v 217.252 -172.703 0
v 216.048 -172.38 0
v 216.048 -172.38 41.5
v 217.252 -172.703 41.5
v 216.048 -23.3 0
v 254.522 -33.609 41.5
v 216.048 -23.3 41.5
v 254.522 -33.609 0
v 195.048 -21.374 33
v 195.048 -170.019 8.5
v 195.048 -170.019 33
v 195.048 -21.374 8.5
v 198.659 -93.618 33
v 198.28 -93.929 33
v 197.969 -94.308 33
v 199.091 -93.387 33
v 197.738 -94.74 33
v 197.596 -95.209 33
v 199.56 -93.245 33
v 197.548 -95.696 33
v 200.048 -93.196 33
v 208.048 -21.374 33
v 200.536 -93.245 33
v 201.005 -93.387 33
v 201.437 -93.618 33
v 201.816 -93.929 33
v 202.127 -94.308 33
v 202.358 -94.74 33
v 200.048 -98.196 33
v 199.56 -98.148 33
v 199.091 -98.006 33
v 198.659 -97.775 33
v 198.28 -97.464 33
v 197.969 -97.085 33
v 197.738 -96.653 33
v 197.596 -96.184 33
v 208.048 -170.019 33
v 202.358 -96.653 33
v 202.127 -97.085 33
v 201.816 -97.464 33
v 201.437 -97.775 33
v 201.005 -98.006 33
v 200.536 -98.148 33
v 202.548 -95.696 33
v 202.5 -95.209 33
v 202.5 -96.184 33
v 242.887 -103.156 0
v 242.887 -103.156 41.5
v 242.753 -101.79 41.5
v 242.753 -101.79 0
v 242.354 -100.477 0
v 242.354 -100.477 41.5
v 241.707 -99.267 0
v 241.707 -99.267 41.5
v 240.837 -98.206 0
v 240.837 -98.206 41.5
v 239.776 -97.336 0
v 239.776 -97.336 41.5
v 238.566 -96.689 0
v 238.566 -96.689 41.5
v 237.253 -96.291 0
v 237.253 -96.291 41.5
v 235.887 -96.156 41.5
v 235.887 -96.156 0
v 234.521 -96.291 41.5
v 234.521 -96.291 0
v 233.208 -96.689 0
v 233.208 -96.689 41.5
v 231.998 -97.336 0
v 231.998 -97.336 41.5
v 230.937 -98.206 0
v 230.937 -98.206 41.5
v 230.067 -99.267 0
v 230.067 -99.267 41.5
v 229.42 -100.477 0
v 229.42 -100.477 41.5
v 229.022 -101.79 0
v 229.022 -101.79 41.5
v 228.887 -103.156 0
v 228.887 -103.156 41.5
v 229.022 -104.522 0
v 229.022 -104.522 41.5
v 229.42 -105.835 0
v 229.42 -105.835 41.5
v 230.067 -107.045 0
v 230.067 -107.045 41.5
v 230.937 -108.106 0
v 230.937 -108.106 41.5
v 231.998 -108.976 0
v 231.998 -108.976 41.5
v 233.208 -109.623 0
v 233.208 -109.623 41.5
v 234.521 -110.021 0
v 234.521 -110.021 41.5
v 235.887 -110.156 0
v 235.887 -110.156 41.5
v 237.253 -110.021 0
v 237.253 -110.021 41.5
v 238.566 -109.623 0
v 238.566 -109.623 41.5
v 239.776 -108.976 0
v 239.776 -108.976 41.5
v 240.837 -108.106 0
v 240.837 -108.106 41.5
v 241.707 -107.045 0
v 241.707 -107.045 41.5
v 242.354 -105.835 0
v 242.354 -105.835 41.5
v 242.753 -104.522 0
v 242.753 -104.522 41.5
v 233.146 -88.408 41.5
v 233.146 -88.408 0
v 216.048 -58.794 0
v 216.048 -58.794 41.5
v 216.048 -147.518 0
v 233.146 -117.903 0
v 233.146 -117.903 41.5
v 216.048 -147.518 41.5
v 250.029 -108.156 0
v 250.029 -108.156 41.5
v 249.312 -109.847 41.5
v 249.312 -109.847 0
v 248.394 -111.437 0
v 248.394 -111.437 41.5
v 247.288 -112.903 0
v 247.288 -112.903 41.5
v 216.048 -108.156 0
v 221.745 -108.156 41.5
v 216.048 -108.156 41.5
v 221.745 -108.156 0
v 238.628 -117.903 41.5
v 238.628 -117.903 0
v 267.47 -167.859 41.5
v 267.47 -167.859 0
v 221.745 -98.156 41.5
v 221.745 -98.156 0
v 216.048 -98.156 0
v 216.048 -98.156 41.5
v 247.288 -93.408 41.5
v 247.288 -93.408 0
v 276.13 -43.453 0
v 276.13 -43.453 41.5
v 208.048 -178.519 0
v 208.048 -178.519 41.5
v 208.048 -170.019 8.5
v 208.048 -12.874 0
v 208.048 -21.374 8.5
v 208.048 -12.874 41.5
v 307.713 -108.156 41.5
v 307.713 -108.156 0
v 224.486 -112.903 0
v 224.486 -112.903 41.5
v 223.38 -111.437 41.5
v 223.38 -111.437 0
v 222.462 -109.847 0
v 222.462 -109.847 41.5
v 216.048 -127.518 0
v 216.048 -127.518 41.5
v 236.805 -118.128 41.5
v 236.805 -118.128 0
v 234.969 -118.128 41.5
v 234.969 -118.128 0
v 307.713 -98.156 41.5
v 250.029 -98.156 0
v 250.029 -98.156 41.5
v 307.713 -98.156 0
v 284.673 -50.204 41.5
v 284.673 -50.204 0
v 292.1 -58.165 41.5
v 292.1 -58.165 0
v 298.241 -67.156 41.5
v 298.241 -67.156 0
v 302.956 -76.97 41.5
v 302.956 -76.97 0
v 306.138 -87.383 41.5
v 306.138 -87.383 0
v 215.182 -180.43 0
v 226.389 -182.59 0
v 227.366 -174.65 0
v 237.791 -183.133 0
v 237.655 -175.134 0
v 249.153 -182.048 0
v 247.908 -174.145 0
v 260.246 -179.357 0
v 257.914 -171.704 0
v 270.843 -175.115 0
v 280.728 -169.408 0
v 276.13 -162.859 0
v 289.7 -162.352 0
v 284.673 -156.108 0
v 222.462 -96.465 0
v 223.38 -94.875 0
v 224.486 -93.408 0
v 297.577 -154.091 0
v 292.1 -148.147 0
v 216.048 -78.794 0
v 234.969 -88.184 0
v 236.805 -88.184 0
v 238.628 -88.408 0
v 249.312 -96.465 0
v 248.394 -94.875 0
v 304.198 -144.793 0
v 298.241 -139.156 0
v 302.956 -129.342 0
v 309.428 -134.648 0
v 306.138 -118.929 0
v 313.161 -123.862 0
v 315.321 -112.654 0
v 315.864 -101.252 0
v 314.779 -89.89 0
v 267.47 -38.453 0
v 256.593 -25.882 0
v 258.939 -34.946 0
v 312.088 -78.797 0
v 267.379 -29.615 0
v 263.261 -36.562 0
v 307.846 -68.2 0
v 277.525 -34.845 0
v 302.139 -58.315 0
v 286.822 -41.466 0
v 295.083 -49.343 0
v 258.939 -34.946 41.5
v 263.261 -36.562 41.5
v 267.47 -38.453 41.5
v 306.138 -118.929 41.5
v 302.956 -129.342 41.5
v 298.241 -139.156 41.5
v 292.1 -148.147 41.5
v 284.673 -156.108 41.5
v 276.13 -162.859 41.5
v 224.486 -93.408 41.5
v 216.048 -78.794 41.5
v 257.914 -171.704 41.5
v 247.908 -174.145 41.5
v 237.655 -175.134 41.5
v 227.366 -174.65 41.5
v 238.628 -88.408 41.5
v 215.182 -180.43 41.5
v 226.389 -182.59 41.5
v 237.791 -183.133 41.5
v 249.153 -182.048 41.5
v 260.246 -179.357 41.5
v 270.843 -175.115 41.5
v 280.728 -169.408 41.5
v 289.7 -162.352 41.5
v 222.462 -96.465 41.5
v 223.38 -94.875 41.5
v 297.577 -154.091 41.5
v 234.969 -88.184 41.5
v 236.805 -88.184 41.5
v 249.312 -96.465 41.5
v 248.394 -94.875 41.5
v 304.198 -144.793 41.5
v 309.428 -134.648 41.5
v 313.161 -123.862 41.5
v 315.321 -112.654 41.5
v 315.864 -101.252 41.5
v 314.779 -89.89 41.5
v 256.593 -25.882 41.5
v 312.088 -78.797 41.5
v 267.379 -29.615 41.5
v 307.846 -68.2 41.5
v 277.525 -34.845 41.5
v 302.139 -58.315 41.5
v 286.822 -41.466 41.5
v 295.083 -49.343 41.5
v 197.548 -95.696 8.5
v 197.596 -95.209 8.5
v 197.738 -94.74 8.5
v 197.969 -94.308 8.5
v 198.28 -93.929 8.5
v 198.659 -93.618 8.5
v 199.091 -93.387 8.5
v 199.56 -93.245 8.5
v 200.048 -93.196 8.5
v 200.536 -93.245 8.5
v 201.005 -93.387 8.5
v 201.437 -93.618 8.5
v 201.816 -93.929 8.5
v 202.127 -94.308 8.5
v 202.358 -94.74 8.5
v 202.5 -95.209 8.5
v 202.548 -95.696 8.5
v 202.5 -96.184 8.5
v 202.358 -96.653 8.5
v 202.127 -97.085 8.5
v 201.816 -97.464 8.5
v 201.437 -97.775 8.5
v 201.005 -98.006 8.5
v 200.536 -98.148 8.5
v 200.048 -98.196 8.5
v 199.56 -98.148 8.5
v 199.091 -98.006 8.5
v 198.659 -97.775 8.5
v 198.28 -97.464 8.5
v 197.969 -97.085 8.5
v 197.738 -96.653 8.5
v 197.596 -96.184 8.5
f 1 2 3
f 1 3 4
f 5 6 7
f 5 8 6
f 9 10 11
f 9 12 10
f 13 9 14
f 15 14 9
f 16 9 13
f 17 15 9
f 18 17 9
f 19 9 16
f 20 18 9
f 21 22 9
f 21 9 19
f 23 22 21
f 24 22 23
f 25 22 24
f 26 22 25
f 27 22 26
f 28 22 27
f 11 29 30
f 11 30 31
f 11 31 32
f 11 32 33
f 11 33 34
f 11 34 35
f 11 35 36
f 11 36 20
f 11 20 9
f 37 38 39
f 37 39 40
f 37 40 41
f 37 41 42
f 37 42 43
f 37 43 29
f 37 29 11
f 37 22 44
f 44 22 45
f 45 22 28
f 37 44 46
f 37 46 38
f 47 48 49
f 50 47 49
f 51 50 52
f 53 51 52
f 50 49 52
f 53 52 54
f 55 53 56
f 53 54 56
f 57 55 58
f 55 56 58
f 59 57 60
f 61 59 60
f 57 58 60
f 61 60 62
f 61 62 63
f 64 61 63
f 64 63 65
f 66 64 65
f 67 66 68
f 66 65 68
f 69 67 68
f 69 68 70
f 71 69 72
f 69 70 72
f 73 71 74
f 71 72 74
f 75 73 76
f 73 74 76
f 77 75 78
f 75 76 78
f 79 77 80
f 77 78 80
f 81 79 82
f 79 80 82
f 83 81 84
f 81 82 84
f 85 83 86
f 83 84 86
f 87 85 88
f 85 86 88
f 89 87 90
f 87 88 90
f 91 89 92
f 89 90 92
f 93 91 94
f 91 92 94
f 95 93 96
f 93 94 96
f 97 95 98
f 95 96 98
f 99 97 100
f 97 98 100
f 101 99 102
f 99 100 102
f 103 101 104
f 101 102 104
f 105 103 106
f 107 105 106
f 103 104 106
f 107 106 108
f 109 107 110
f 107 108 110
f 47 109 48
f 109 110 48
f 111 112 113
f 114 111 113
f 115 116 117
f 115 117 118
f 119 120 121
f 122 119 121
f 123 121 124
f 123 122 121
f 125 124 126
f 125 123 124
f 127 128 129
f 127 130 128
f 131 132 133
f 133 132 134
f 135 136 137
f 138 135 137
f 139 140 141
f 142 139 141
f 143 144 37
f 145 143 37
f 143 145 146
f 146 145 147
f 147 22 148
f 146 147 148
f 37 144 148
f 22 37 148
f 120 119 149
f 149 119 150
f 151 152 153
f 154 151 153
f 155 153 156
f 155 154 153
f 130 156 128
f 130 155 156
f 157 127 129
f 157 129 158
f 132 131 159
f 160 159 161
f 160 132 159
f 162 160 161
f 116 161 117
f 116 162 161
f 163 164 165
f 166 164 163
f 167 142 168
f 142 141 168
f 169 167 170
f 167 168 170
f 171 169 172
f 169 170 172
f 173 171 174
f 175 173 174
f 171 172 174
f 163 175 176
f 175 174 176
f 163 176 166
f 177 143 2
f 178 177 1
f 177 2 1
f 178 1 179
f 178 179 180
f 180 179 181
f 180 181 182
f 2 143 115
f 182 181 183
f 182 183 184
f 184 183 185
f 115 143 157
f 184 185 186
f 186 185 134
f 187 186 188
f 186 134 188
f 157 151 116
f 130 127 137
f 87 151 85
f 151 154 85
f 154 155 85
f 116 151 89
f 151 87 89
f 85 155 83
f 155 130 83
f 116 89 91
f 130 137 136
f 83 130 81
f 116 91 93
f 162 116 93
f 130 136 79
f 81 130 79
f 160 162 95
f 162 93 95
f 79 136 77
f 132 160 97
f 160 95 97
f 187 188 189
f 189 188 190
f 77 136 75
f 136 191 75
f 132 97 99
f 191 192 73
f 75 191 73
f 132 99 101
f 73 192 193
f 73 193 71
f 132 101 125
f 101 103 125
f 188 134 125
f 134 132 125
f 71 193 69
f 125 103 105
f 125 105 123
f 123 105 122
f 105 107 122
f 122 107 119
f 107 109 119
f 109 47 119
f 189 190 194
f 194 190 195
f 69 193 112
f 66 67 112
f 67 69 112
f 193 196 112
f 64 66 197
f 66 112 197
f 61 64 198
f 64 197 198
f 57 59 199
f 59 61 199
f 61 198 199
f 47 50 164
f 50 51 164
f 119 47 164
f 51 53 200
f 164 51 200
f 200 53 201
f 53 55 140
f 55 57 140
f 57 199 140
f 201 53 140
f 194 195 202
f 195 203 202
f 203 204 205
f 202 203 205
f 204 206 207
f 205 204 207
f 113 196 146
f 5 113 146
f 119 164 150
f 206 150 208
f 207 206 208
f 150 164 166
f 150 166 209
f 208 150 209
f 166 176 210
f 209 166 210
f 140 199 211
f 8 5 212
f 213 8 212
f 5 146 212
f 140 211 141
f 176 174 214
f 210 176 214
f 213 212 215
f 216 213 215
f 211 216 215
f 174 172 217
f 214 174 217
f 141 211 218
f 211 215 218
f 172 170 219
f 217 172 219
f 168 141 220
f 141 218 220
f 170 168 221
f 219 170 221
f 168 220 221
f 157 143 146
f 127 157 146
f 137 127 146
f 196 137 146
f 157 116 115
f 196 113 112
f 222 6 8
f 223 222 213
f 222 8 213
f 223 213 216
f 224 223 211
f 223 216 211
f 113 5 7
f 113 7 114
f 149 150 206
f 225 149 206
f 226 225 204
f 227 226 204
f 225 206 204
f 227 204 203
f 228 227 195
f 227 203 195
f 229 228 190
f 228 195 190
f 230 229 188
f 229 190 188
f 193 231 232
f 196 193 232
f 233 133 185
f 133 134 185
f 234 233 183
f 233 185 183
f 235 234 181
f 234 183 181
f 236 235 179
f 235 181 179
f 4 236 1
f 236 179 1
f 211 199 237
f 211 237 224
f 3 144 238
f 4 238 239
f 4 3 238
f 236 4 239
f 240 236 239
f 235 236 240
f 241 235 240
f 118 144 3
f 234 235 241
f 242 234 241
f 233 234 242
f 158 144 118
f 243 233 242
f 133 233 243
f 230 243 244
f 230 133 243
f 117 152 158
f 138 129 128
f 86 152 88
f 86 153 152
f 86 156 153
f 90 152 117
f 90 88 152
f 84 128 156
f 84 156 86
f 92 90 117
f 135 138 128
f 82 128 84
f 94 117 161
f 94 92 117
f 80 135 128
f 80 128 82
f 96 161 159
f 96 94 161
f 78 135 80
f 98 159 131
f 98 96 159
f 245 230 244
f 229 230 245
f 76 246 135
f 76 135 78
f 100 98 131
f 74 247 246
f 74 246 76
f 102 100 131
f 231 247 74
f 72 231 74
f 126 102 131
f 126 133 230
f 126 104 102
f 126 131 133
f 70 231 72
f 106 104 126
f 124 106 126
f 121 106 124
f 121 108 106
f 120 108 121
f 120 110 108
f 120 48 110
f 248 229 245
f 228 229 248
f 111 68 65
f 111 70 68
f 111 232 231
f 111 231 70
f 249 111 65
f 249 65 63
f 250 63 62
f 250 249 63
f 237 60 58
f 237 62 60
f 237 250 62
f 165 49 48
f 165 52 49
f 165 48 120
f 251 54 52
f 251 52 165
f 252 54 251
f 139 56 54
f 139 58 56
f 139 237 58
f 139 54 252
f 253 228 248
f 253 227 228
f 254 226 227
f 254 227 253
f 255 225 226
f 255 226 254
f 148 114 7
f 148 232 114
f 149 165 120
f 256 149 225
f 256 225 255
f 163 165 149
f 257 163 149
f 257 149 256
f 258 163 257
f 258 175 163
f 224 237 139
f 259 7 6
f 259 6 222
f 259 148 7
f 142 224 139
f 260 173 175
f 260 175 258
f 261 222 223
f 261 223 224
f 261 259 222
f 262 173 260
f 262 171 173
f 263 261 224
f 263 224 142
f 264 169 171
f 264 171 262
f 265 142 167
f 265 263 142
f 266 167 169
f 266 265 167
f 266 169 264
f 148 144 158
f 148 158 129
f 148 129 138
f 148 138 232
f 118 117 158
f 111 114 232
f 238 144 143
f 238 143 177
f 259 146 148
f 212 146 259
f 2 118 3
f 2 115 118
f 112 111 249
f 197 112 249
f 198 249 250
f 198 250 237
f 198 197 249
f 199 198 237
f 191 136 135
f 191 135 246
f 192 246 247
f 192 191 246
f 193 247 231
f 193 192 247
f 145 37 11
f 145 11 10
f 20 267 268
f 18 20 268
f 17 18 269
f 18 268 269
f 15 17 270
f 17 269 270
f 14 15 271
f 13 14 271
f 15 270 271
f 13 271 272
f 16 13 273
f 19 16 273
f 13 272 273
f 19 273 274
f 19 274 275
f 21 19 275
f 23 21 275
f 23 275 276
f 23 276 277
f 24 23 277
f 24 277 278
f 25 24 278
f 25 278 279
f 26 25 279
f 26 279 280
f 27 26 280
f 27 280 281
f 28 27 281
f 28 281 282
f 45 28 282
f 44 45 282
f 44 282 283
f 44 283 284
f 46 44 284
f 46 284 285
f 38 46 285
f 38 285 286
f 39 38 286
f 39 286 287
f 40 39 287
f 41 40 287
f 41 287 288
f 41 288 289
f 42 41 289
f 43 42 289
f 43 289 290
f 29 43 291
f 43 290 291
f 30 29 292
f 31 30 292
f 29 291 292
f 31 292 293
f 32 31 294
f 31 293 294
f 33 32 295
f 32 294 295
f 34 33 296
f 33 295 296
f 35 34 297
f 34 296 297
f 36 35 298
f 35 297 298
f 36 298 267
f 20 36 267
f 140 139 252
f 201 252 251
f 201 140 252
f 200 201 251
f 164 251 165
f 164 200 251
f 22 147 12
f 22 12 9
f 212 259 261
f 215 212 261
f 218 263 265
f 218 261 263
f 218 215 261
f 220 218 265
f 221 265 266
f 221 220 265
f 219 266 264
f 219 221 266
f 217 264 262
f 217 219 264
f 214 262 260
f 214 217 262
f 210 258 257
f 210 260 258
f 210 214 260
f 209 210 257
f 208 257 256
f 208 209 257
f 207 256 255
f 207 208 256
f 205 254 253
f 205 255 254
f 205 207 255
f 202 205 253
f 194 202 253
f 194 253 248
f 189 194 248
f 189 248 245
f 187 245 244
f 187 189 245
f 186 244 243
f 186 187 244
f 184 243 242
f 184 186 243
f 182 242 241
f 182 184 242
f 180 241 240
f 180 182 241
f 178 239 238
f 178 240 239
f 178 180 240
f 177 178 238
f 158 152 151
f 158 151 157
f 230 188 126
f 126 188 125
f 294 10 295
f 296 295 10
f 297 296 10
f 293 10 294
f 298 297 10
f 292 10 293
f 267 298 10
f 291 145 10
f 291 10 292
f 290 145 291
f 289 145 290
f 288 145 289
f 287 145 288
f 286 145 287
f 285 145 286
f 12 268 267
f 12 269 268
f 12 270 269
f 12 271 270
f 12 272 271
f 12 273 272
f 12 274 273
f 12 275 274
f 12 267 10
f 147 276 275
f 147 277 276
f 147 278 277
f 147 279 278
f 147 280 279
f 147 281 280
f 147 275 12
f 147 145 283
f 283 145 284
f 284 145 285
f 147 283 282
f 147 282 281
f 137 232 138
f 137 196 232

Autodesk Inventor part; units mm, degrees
ref_plane "YZ Plane" through (0, 0, 0) normal (1, 0, 0) x (0, 1, 0)
ref_plane "XZ Plane" through (0, 0, 0) normal (0, 1, 0) x (-1, 0, 0)
ref_plane "XY Plane" through (0, 0, 0) normal (0, 0, 1) x (1, 0, 0)
sketch "Sketch1" plane through (0, 0, 0) normal (0, 0, 1) x (1, 0, 0)
  line L0 (0, 0) -> (160, 0)
  line L1 (160, 0) -> (118.589, -154.5481) construction
  line L2 (0, 0) -> (41.411, -154.5481) construction
  line L3 (41.411, -154.5481) -> (118.589, -154.5481)
  circle A0 centre (235.8871, -103.156) radius 80 construction
  line L4 (160, 0) -> (256.5926, -25.8819)
  line L5 (118.589, -154.5481) -> (215.1815, -180.43)
  arc A1 (215.1815, -180.43) -> (256.5926, -25.8819) centre (235.8871, -103.156) ccw
  circle A2 centre (-75.8871, -103.156) radius 80 construction
  line L6 (0, 0) -> (-96.5926, -25.8819)
  line L7 (41.411, -154.5481) -> (-55.1815, -180.43)
  arc A3 (-96.5926, -25.8819) -> (-55.1815, -180.43) centre (-75.8871, -103.156) ccw
  dimension "d0" = 160
  dimension "d1" = 160
  dimension "d2" = 160
  dimension "d3" = 75
  dimension "d4" = 75
  dimension "d5" = 160
  dimension "d6" = 100
  dimension "d7" = 160
  dimension "d9" = 100
extrude "Extrusion1" add sketch "Sketch1" along normal blind 41.5
sketch "Sketch2" plane through (0, 0, 41.5) normal (0, 0, 1) x (1, 0, 0)
  line L0 (-26.5, -133) -> (186.5, -133)
  line L1 (186.5, -133) -> (186.5, -20)
  line L2 (186.5, -20) -> (-26.5, -20)
  line L3 (-26.5, -20) -> (-26.5, -133)
  line L4 (160, 0) -> (0, 0) projected
  point P0 (80, -20)
  point P1 (80, 0)
  dimension "d12" = 213
  dimension "d13" = 113
  dimension "d14" = 20
extrude "Extrusion2" cut sketch "Sketch2" against normal through all
sketch "Sketch3" plane through (0, 0, 41.5) normal (0, 0, 1) x (1, 0, 0)
  line L0 (-26.5, -133) -> (-26.5, -20) construction
  line L1 (-26.5, -20) -> (186.5, -20) construction
  line L2 (186.5, -20) -> (186.5, -133) construction
  line L3 (186.5, -133) -> (-26.5, -133) construction
  line L4 (-48.0481, 1.5481) -> (-48.0481, -154.5481) construction
  line L5 (-48.0481, -154.5481) -> (208.0481, -154.5481) construction
  line L6 (208.0481, -154.5481) -> (208.0481, 1.5481) construction
  line L7 (208.0481, 1.5481) -> (-48.0481, 1.5481) construction
  line L8 (41.411, -154.5481) -> (118.589, -154.5481) construction
  line L9 (-48.0481, 1.5481) -> (-48.0481, -178.5186) construction
  line L10 (-55.1815, -180.43) -> (41.411, -154.5481) construction
  line L11 (208.0481, 1.5481) -> (208.0481, -178.5186) construction
  line L12 (118.589, -154.5481) -> (215.1815, -180.43) construction
  line L13 (-48.0481, -178.5186) -> (208.0481, -178.5186) construction
  line L14 (-48.0481, 1.5481) -> (208.0481, 1.5481) construction
  line L15 (160, 0) -> (256.5926, -25.8819) construction
  line L16 (208.2963, -12.941) -> (208.0481, -178.5186)
  line L17 (208.2963, -12.941) -> (256.5926, -25.8819)
  line L18 (208.0481, -178.5186) -> (215.1815, -180.43)
  arc A0 (215.1815, -180.43) -> (256.5926, -25.8819) centre (235.8871, -103.156) ccw
  line L19 (208.0481, 1.5481) -> (-166.9519, 1.5481)
  line L20 (-166.9519, 1.5481) -> (-166.9519, -188.4519)
  line L21 (-166.9519, -188.4519) -> (208.0481, -188.4519)
  line L22 (208.0481, -188.4519) -> (208.0481, 1.5481)
  point P0 (0, 0)
  point P1 (80, -154.5481)
  dimension "d17" = 190
  dimension "d18" = 375
extrude "Extrusion3" cut sketch "Sketch3" against normal through all contours L22 L21 L20 L19
sketch "Sketch4" plane through (0, 0, 41.5) normal (0, 0, 1) x (1, 0, 0)
  arc A0 (215.1815, -180.43) -> (256.5926, -25.8819) centre (235.8871, -103.156) ccw projected
  circle A1 centre (235.8871, -103.156) radius 7
  point P0 (0, 0)
  dimension "d21" = 14
extrude "Extrusion4" cut sketch "Sketch4" against normal through all
sketch "Sketch5" plane through (208.0481, -178.5186, 41.5) normal (-1, 0, 0) x (0, 0, 1)
  line L0 (-41.5, 165.6442) -> (0, 165.6442) projected
  line L1 (-41.5, 0) -> (-41.5, 165.6442) projected
  line L2 (0, 0) -> (-41.5, 0) projected
  line L3 (0, 165.6442) -> (0, 0) projected
  line L4 (-33, 157.1442) -> (-8.5, 157.1442)
  line L5 (-8.5, 157.1442) -> (-8.5, 8.5)
  line L6 (-8.5, 8.5) -> (-33, 8.5)
  line L7 (-33, 8.5) -> (-33, 157.1442)
  point P0 (-41.5, 178.5186)
  dimension "d24" = 8.5
extrude "Extrusion5" add sketch "Sketch5" along normal blind 13 contours L4 L5 L6 L7
sketch "Sketch6" plane through (208.0481, -170.0186, 8.5) normal (0, 0, -1) x (-1, 0, 0)
  circle A0 centre (8, 74.3221) radius 2.5
  line L0 (0, -8.5) -> (0, 157.1442) projected
  point P0 (208.0481, 170.0186)
  point P1 (0, 74.3221)
  dimension "d27" = 5
  dimension "d28" = 8
extrude "Extrusion6" cut sketch "Sketch6" against normal through all
sketch "Sketch7" plane through (0, 0, 0) normal (0, 0, -1) x (-1, 0, 0)
  circle A0 centre (-235.8871, -103.156) radius 7 projected
  line L0 (-208.0481, -178.5186) -> (-208.0481, -12.8745) projected
  line L1 (-208.0481, -12.8745) -> (-256.5926, -25.8819) projected
  arc A1 (-256.5926, -25.8819) -> (-215.1815, -180.43) centre (-235.8871, -103.156) ccw projected
  line L2 (-215.1815, -180.43) -> (-208.0481, -178.5186) projected
  line L3 (-254.522, -33.6093) -> (-216.0481, -23.3003)
  line L4 (-216.0481, -23.3003) -> (-216.0481, -172.38)
  line L5 (-216.0481, -172.38) -> (-217.2521, -172.7026)
  arc A2 (-254.522, -33.6093) -> (-217.2521, -172.7026) centre (-235.8871, -103.156) ccw
  circle A3 centre (-235.8871, -103.156) radius 15
  point P0 (0, 0)
  dimension "d31" = 8
  dimension "d32" = 8
extrude "Extrusion7" cut sketch "Sketch7" against normal through all contours L3 L4 L5 A2
sketch "Sketch8" plane through (0, 0, 0) normal (0, 0, -1) x (-1, 0, 0)
  circle A0 centre (-235.8871, -103.156) radius 7 construction
  circle A1 centre (-235.8871, -103.156) radius 15 construction
  line L0 (-235.8871, -103.156) -> (-159.7277, -103.156) construction
  line L1 (-221.7449, -98.156) -> (-123.6167, -98.156) construction
  line L2 (-221.7449, -108.156) -> (-123.6167, -108.156) construction
  line L3 (-233.1461, -88.4085) -> (-184.082, -3.427) construction
  line L4 (-224.4859, -93.4085) -> (-175.4217, -8.427) construction
  line L5 (-247.2883, -93.4085) -> (-296.3524, -8.427) construction
  line L6 (-238.628, -88.4085) -> (-287.6921, -3.427) construction
  line L7 (-250.0292, -108.156) -> (-348.1575, -108.156) construction
  line L8 (-250.0292, -98.156) -> (-348.1575, -98.156) construction
  line L9 (-238.628, -117.9034) -> (-287.6921, -202.885) construction
  line L10 (-247.2883, -112.9034) -> (-296.3524, -197.885) construction
  line L11 (-224.4859, -112.9034) -> (-175.4217, -197.885) construction
  line L12 (-233.1461, -117.9034) -> (-184.082, -202.885) construction
  line L13 (-216.0481, -23.3003) -> (-216.0481, -172.38) construction
  arc A2 (-254.522, -33.6093) -> (-217.2521, -172.7026) centre (-235.8871, -103.156) ccw construction
  line L14 (-254.522, -33.6093) -> (-216.0481, -23.3003) construction
  line L15 (-216.0481, -172.38) -> (-217.2521, -172.7026) construction
  line L16 (-221.7449, -98.156) -> (-216.0481, -98.156)
  line L17 (-221.7449, -108.156) -> (-216.0481, -108.156)
  line L18 (-224.4859, -112.9034) -> (-216.0481, -127.518)
  line L19 (-233.1461, -117.9034) -> (-216.0481, -147.518)
  line L20 (-238.628, -117.9034) -> (-267.47, -167.8593)
  line L21 (-276.1303, -162.8593) -> (-247.2883, -112.9034)
  line L22 (-250.0292, -108.156) -> (-307.7132, -108.156)
  line L23 (-250.0292, -98.156) -> (-307.7132, -98.156)
  line L24 (-247.2883, -93.4085) -> (-276.1303, -43.4527)
  line L25 (-238.628, -88.4085) -> (-267.47, -38.4527)
  line L26 (-233.1461, -88.4085) -> (-216.0481, -58.7939)
  line L27 (-224.4859, -93.4085) -> (-216.0481, -78.7939)
  line L28 (-216.0481, -58.7939) -> (-216.0481, -78.7939)
  line L29 (-216.0481, -98.156) -> (-216.0481, -108.156)
  line L30 (-216.0481, -127.518) -> (-216.0481, -147.518)
  arc A3 (-267.47, -38.4527) -> (-276.1303, -43.4527) centre (-235.8871, -103.156) ccw
  arc A4 (-307.7132, -98.156) -> (-307.7132, -108.156) centre (-235.8871, -103.156) ccw
  arc A5 (-276.1303, -162.8593) -> (-267.47, -167.8593) centre (-235.8871, -103.156) ccw
  arc A6 (-221.7449, -108.156) -> (-221.7449, -98.156) centre (-235.8871, -103.156) ccw
  arc A7 (-233.1461, -117.9034) -> (-224.4859, -112.9034) centre (-235.8871, -103.156) ccw
  arc A8 (-247.2883, -112.9034) -> (-238.628, -117.9034) centre (-235.8871, -103.156) ccw
  arc A9 (-250.0292, -98.156) -> (-250.0292, -108.156) centre (-235.8871, -103.156) ccw
  arc A10 (-238.628, -88.4085) -> (-247.2883, -93.4085) centre (-235.8871, -103.156) ccw
  arc A11 (-224.4859, -93.4085) -> (-233.1461, -88.4085) centre (-235.8871, -103.156) ccw
  point P0 (0, 0)
  dimension "d36" = 5
  dimension "d37" = 5
  dimension "d40" = 360
extrude "Extrusion8" add sketch "Sketch8" against normal blind 41.5
properties part number "Riser Base" material "ABS Plastic"
